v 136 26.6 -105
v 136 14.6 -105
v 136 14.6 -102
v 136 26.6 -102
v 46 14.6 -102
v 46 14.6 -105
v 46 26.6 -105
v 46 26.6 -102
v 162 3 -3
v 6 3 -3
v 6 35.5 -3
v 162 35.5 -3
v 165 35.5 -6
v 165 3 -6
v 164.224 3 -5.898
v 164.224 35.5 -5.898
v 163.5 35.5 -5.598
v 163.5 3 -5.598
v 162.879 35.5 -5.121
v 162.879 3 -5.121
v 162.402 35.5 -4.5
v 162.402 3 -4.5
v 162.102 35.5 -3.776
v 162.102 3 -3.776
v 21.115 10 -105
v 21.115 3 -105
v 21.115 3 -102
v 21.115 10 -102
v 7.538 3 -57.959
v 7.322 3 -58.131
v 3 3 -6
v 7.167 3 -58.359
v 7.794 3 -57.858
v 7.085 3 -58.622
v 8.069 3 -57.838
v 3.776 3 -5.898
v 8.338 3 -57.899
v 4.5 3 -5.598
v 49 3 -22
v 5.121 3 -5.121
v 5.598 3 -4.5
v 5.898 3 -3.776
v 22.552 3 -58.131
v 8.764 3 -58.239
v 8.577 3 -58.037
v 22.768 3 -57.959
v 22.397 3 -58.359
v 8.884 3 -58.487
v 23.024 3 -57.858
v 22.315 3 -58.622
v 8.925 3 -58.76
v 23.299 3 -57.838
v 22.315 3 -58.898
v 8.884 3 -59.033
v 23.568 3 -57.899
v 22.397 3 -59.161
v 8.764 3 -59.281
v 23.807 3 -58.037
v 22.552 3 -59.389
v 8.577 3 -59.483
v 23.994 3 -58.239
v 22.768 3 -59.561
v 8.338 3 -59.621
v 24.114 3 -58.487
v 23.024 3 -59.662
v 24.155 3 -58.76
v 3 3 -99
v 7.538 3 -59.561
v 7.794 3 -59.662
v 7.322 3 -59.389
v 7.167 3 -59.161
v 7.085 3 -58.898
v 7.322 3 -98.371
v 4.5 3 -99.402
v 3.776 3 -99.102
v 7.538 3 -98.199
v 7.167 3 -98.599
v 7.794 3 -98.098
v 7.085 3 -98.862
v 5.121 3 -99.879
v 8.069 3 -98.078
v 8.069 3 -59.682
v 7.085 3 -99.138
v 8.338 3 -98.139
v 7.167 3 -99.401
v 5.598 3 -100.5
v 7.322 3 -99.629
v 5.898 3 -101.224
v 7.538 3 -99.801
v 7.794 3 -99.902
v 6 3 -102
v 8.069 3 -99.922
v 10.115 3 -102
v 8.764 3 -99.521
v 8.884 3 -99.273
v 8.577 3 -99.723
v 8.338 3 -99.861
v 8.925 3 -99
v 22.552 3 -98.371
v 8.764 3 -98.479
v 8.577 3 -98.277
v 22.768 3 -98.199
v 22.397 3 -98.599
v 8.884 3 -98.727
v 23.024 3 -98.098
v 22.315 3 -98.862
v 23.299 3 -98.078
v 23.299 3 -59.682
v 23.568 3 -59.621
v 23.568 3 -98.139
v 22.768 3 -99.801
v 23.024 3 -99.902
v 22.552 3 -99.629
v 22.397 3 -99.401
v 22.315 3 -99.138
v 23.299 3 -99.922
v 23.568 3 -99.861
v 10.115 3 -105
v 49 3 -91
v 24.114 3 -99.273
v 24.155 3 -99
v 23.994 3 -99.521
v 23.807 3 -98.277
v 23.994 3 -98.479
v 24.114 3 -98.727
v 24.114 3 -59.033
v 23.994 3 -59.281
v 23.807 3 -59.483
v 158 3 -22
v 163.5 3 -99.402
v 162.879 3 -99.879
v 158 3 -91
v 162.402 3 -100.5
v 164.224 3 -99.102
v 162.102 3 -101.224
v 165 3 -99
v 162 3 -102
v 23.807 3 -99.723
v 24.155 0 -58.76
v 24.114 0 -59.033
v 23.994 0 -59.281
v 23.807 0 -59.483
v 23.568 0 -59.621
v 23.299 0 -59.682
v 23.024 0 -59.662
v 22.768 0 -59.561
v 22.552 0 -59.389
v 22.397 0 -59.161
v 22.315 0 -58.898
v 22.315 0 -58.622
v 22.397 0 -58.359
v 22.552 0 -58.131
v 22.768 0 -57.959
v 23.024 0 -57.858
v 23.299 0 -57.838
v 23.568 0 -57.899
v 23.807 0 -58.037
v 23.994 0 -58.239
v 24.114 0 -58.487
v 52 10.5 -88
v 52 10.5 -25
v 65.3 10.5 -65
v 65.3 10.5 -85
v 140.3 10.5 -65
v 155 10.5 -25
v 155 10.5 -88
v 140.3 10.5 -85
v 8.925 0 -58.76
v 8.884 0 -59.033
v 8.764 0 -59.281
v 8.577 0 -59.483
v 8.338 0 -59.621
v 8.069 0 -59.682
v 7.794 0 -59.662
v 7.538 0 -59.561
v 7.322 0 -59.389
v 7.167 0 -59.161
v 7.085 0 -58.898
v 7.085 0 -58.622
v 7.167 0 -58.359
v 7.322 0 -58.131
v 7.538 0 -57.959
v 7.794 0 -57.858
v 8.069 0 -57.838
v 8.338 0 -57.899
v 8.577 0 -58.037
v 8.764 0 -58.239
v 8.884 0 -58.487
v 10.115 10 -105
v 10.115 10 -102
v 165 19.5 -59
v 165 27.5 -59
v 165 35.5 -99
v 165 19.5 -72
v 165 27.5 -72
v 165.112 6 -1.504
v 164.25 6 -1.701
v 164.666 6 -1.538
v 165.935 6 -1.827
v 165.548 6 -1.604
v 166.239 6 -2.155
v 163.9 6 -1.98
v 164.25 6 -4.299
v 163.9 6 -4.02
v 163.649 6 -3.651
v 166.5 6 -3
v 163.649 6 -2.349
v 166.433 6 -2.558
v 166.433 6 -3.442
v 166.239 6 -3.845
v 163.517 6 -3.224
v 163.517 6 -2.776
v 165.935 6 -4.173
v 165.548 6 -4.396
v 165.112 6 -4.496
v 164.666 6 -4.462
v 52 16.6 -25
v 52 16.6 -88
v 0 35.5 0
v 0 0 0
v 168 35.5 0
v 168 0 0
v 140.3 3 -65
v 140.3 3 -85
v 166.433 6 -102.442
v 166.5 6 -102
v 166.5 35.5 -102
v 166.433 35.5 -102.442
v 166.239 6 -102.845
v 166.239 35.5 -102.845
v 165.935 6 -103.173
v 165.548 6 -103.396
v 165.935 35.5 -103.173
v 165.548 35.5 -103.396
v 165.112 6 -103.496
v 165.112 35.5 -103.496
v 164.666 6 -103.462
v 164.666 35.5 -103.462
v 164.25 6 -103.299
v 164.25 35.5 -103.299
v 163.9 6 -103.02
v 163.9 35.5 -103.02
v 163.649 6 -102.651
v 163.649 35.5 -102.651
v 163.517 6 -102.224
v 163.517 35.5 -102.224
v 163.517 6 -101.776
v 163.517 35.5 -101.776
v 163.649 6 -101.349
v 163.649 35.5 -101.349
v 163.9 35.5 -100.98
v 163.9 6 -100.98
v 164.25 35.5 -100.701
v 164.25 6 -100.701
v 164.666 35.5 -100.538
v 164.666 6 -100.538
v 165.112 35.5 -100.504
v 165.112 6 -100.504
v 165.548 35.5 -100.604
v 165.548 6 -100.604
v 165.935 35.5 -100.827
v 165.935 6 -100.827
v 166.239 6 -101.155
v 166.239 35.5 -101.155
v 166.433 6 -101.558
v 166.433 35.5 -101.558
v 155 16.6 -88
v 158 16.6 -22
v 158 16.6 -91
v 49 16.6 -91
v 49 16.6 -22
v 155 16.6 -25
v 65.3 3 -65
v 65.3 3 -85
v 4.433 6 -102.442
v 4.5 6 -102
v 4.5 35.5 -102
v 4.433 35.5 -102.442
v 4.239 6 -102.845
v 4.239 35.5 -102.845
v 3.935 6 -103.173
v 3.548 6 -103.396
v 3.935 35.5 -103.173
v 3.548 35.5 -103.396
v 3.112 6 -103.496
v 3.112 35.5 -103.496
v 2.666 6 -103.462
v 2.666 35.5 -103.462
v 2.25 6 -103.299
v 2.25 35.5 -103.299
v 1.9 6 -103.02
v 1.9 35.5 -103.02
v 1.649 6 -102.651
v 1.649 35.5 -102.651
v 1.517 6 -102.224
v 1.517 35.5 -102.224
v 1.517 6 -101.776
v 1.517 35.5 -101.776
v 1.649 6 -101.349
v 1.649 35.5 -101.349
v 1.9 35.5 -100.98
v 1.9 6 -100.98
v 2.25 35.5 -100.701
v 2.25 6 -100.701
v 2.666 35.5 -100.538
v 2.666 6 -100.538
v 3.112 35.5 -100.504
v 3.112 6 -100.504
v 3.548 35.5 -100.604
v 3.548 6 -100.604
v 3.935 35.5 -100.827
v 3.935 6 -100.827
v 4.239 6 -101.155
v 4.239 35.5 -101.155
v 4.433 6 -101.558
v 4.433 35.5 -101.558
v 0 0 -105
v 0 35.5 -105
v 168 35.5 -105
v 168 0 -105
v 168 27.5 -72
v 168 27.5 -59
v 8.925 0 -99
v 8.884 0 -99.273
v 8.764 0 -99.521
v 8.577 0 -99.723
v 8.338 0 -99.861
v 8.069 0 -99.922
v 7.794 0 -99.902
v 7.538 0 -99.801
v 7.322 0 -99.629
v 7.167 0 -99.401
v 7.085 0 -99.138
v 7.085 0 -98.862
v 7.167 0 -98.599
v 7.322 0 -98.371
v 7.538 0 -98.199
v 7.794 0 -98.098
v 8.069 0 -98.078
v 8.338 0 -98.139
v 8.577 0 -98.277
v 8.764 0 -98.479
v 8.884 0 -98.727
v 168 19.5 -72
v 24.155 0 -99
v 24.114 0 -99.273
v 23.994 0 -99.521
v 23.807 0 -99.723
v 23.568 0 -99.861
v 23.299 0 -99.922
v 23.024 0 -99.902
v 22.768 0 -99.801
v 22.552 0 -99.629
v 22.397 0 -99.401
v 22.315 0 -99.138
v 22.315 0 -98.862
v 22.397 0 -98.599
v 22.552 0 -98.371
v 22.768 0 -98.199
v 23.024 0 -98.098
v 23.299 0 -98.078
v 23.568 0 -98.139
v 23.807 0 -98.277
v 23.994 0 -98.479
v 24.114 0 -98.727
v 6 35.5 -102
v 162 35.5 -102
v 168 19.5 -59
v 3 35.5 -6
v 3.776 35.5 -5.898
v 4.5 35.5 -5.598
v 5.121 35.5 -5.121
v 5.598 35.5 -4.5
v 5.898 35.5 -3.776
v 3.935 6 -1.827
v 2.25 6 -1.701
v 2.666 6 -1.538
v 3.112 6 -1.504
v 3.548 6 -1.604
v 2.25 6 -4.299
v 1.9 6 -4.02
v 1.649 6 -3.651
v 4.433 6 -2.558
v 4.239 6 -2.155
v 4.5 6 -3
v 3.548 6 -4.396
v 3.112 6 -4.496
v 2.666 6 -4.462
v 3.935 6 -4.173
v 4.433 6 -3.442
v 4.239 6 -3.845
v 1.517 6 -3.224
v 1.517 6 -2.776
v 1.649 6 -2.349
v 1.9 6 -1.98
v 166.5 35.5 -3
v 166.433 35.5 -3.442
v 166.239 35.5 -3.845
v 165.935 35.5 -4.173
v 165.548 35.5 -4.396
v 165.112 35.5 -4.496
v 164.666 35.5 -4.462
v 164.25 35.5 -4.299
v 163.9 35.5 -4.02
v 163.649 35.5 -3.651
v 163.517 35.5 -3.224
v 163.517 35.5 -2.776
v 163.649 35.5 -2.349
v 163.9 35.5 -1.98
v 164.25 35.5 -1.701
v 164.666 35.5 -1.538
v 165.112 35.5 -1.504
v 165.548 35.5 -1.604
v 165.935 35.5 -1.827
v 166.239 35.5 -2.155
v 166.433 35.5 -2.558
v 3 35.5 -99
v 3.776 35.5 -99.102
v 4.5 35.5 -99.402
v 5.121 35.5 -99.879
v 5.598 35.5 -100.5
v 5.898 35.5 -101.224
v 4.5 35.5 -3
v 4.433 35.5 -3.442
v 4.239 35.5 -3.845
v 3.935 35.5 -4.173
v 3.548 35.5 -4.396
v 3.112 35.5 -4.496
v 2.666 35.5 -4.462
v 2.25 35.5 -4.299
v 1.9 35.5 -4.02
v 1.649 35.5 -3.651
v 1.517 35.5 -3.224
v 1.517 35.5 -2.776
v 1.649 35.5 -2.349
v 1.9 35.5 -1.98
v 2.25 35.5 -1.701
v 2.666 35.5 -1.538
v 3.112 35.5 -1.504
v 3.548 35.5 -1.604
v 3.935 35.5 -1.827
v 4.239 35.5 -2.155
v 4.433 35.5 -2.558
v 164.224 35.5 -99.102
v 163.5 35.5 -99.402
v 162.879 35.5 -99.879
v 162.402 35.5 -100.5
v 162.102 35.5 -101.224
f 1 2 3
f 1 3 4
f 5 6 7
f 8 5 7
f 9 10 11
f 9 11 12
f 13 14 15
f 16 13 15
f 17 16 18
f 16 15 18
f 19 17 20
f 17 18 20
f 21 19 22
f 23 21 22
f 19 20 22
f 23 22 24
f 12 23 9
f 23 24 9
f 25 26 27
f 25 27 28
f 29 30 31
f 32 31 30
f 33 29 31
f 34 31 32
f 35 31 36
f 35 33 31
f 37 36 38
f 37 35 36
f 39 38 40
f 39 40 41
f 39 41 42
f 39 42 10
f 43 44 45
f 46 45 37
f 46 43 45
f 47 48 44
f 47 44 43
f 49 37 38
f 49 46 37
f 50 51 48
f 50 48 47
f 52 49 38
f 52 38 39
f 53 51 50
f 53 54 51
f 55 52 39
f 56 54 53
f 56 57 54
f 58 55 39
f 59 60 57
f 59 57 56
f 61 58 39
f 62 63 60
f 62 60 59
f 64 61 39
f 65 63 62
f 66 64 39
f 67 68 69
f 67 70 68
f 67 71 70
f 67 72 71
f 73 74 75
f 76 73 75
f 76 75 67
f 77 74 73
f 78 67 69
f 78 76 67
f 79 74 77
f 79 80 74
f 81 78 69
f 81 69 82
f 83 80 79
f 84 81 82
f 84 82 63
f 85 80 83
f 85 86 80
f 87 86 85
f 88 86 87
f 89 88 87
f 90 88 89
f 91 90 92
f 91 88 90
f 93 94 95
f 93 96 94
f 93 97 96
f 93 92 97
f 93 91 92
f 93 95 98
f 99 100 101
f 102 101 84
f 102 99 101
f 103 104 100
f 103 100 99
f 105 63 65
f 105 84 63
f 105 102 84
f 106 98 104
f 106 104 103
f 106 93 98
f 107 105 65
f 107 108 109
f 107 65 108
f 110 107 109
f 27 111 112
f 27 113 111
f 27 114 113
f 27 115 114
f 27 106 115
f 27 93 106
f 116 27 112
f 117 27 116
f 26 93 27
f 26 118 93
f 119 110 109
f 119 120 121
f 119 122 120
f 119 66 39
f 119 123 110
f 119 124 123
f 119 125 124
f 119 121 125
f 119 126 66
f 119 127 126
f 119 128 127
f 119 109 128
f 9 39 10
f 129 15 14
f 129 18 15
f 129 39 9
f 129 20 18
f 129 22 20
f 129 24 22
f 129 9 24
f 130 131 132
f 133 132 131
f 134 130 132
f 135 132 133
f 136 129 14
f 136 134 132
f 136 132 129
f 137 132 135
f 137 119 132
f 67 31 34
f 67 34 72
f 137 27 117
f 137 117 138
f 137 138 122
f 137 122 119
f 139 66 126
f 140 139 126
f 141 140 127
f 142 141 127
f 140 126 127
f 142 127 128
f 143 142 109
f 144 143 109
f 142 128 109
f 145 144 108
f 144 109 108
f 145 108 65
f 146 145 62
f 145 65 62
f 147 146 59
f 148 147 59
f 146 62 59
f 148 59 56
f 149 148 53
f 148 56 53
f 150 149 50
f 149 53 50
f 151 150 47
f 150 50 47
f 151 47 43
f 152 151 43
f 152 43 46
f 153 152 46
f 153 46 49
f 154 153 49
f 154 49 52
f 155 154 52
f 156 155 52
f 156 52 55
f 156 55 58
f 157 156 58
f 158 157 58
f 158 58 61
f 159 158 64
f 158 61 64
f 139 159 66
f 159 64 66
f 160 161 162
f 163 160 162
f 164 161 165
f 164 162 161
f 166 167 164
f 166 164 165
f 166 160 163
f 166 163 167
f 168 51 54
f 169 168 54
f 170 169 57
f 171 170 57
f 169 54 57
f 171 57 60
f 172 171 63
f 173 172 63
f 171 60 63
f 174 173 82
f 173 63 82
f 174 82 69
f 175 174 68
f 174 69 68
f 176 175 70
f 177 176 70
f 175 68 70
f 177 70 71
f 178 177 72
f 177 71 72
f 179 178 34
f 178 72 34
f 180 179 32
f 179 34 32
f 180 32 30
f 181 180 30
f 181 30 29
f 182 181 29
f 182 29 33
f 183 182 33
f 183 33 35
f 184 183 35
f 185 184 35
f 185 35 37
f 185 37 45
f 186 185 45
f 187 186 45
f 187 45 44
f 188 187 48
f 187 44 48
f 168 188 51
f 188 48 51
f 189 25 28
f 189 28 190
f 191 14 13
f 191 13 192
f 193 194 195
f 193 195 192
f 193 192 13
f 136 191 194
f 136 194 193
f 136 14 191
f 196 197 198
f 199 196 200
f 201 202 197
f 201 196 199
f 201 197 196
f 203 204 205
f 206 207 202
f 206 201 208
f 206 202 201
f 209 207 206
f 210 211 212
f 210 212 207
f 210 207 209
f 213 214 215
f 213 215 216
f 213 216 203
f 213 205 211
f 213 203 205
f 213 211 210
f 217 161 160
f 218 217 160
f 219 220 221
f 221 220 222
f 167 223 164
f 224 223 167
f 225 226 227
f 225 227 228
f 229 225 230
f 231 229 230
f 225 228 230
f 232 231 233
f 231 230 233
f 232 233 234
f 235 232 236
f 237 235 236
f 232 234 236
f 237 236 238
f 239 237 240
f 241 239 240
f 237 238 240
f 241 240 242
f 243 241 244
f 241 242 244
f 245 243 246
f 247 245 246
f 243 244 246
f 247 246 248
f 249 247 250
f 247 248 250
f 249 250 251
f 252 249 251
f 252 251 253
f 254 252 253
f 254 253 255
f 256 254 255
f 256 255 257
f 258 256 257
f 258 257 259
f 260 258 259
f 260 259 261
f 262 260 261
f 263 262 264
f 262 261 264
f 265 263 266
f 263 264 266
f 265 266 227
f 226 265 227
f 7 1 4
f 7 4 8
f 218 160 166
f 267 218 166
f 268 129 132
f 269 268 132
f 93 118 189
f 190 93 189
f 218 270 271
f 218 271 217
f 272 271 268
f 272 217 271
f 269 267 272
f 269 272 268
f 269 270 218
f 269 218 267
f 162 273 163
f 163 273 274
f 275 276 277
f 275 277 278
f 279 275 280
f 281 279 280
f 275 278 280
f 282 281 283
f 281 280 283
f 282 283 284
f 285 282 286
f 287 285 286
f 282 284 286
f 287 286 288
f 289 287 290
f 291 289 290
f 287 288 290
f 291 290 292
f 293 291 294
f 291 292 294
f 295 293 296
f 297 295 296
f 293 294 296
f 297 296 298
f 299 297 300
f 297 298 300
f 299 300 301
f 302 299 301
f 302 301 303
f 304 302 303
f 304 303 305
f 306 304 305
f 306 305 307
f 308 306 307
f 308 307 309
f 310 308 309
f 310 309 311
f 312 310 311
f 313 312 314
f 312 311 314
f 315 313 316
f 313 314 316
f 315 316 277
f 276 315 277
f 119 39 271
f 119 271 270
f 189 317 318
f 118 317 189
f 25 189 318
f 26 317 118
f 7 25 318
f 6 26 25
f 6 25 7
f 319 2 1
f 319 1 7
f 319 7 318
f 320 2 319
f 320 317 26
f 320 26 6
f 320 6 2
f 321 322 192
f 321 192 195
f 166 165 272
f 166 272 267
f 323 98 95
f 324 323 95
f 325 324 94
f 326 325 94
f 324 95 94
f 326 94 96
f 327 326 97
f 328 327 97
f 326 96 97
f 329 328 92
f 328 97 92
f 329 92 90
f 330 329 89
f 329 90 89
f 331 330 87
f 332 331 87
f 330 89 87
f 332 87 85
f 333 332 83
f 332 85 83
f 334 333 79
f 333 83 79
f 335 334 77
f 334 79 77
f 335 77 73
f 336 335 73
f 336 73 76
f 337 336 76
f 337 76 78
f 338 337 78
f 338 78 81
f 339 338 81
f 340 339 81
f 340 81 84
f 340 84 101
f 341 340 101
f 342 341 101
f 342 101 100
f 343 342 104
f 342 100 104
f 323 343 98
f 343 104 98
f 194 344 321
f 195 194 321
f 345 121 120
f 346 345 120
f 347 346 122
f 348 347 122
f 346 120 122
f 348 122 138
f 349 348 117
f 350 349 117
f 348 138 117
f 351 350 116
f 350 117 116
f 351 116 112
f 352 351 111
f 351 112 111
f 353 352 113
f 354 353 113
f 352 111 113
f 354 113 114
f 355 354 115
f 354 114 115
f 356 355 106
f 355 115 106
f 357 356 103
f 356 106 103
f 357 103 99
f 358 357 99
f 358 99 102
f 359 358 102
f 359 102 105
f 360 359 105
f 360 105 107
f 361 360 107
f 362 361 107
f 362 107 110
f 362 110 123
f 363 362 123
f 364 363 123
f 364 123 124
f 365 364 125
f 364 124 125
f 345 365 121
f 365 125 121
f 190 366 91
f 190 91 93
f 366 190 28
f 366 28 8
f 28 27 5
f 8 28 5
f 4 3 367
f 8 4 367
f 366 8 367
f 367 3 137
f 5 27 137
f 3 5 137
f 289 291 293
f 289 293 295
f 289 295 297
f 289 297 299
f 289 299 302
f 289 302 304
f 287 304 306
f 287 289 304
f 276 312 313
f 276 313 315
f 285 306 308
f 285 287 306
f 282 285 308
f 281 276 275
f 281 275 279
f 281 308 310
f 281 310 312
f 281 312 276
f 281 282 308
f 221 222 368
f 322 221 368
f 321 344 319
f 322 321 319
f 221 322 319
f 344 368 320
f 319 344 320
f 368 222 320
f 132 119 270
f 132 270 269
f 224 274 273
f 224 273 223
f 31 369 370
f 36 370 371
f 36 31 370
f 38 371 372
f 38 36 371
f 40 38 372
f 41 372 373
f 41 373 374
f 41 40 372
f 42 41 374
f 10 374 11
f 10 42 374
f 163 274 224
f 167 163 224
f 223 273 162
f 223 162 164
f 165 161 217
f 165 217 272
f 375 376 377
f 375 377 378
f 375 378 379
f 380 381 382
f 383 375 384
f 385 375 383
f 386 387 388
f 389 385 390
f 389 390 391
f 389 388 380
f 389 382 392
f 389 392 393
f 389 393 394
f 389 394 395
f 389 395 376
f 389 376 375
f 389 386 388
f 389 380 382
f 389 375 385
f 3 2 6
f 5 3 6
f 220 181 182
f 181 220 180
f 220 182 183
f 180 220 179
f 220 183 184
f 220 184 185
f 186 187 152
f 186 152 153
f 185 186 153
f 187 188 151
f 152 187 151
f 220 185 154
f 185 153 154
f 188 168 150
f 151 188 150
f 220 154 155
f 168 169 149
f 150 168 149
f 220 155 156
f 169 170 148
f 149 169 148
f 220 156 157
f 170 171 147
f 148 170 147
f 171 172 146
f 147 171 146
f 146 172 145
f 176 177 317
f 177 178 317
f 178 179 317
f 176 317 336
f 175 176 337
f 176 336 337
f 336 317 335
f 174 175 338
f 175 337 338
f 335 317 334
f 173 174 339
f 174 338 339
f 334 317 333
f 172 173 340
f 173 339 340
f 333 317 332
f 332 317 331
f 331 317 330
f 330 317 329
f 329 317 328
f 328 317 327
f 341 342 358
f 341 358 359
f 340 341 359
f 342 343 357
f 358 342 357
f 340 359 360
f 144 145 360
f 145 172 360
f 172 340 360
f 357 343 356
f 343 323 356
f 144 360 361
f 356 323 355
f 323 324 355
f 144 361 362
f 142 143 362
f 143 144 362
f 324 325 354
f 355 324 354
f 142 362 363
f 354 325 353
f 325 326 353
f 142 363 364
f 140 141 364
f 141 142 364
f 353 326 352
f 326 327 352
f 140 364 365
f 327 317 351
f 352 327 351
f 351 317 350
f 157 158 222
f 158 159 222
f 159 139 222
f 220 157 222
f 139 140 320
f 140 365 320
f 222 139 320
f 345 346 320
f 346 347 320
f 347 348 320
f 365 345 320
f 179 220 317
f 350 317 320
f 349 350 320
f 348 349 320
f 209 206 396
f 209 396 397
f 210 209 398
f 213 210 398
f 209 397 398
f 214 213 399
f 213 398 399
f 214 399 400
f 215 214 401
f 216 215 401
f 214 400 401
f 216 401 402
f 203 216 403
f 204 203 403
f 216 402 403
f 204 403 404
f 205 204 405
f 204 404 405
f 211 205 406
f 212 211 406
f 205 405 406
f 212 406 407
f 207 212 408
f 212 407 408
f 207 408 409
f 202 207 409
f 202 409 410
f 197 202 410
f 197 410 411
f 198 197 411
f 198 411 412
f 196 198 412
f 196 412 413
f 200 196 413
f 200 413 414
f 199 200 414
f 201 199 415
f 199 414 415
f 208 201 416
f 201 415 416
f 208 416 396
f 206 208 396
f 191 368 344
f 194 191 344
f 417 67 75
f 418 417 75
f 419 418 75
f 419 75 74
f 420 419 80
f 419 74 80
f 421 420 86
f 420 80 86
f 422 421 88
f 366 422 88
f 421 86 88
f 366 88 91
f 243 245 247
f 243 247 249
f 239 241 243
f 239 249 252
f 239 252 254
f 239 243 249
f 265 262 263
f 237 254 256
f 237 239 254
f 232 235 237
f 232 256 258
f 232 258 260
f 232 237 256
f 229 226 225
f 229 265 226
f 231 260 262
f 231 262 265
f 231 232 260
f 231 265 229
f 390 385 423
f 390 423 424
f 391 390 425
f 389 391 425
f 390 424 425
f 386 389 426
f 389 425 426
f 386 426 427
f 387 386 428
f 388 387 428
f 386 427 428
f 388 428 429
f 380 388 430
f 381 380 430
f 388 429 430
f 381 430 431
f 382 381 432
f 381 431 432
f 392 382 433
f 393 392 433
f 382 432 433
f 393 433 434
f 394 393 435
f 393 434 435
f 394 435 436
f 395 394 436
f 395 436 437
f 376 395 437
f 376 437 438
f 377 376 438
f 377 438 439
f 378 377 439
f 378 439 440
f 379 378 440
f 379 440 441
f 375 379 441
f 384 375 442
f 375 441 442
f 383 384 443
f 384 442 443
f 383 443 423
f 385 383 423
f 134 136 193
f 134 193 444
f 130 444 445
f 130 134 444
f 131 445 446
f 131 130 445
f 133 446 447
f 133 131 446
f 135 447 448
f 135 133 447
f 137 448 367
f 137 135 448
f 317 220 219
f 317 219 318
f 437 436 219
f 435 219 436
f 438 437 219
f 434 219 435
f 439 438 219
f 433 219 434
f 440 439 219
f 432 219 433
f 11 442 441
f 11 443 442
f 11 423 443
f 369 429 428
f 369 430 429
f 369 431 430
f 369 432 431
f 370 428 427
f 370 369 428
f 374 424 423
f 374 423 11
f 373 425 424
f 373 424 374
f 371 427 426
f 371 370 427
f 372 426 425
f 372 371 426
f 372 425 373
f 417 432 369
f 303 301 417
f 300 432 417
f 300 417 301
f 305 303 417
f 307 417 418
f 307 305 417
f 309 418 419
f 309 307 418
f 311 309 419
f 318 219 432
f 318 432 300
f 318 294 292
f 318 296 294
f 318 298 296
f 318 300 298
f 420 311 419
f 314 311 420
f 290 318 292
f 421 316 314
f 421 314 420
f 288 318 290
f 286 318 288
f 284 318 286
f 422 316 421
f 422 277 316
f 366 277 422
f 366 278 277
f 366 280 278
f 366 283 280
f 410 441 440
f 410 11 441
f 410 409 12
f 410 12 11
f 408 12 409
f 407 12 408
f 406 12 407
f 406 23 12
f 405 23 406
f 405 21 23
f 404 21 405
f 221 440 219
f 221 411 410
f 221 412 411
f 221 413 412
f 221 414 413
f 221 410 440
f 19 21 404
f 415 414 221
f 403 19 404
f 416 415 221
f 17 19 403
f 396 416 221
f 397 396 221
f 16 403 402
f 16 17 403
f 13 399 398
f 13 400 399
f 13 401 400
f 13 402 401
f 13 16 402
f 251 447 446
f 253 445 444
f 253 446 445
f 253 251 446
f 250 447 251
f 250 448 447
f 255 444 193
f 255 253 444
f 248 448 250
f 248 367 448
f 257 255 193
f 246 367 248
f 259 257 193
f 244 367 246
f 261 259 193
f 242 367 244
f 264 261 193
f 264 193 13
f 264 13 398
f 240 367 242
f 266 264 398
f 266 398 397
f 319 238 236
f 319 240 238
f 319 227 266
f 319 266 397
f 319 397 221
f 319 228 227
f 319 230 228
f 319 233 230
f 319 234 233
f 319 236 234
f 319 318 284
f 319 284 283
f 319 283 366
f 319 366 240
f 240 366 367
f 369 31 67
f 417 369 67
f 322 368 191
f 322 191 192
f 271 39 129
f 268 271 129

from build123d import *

# Parameters (mm, degrees)
SKETCH1_W           = 168
SKETCH1_H           = 105
BOSS_EXTRUDE1_DEPTH = 35.5
SHELL3_T            = -3
SKETCH3_R           = 0.925
CUT_EXTRUDE2_DEPTH  = 3
SKETCH7_W           = 109
SKETCH7_H           = 69
SKETCH7_W_2         = 103
SKETCH7_H_2         = 63
BOSS_EXTRUDE3_DEPTH = 13.6
SKETCH8_W           = 103
SKETCH8_H           = 63
SKETCH8_W_2         = 75
SKETCH8_H_2         = 20
BOSS_EXTRUDE4_DEPTH = 7.5
SKETCH2_W           = 11
SKETCH2_H           = 7
SKETCH2_W_2         = 90
SKETCH2_H_2         = 12
CUT_EXTRUDE1_DEPTH  = 3
BOSS_EXTRUDE2_DEPTH = 32.5
SKETCH5_R           = 1.5
CUT_EXTRUDE3_DEPTH  = 29.5
SKETCH13_W          = 13
SKETCH13_H          = 8
CUT_EXTRUDE8_DEPTH  = 3


with BuildPart() as part:
    # Sketch1 → Boss-Extrude1 (new body)
    with BuildSketch(Plane(origin=(0, 0, 0), x_dir=(1, 0, 0), z_dir=(0, 1, 0))):
        with Locations((84, 52.5)):
            Rectangle(SKETCH1_W, SKETCH1_H)
    extrude(amount=BOSS_EXTRUDE1_DEPTH)

    # Shell3
    shell3_openings = [part.faces().sort_by_distance(p)[0] for p in [
        (84, 35.5, -52.5),
    ]]
    offset(amount=SHELL3_T, openings=shell3_openings, kind=Kind.INTERSECTION)

    # Sketch3 → Cut-Extrude2 (cut)
    with BuildSketch(Plane(origin=(0, 3, 0), x_dir=(1, 0, 0), z_dir=(0, 1, 0))):
        with Locations((8, 99)):
            Circle(SKETCH3_R)
        with Locations((23.23, 99)):
            Circle(SKETCH3_R)
        with Locations((23.23, 58.76)):
            Circle(SKETCH3_R)
        with Locations((8, 58.76)):
            Circle(SKETCH3_R)
    extrude(amount=-CUT_EXTRUDE2_DEPTH, mode=Mode.SUBTRACT)

    # Sketch7 → Boss-Extrude3 (add)
    with BuildSketch(Plane(origin=(0, 3, 0), x_dir=(1, 0, 0), z_dir=(0, 1, 0))):
        with Locations((103.5, 56.5)):
            Rectangle(SKETCH7_W, SKETCH7_H)
        with Locations((103.5, 56.5)):
            Rectangle(SKETCH7_W_2, SKETCH7_H_2, mode=Mode.SUBTRACT)
    extrude(amount=BOSS_EXTRUDE3_DEPTH)

    # Sketch8 → Boss-Extrude4 (add)
    with BuildSketch(Plane(origin=(0, 3, 0), x_dir=(1, 0, 0), z_dir=(0, 1, 0))):
        with Locations((103.5, 56.5)):
            Rectangle(SKETCH8_W, SKETCH8_H)
        with Locations((102.8, 75)):
            Rectangle(SKETCH8_W_2, SKETCH8_H_2, mode=Mode.SUBTRACT)
    extrude(amount=BOSS_EXTRUDE4_DEPTH)

    # Sketch2 → Cut-Extrude1 (cut)
    with BuildSketch(Plane(origin=(0, 0, -105), x_dir=(-1, 0, 0), z_dir=(0, 0, -1))):
        with Locations((-15.615, 6.5)):
            Rectangle(SKETCH2_W, SKETCH2_H)
        with Locations((-91, 20.6)):
            Rectangle(SKETCH2_W_2, SKETCH2_H_2)
    extrude(amount=-CUT_EXTRUDE1_DEPTH, mode=Mode.SUBTRACT)

    # Sketch4 → Boss-Extrude2 (add)
    with BuildSketch(Plane(origin=(0, 3, 0), x_dir=(1, 0, 0), z_dir=(0, 1, 0))):
        with BuildLine():
            Line((6, 102), (3, 102))
            Line((3, 102), (3, 99))
            ThreePointArc((3, 99), (5.121320344, 99.878679656), (6, 102))
        make_face()
        with BuildLine():
            Line((162, 102), (165, 102))
            Line((165, 102), (165, 99))
            ThreePointArc((165, 99), (162.878679656, 99.878679656), (162, 102))
        make_face()
        with BuildLine():
            Line((165, 3), (165, 6))
            ThreePointArc((165, 6), (162.878679656, 5.121320344), (162, 3))
            Line((162, 3), (165, 3))
        make_face()
        with BuildLine():
            Line((6, 3), (3, 3))
            Line((3, 3), (3, 6))
            ThreePointArc((3, 6), (5.121320344, 5.121320344), (6, 3))
        make_face()
    extrude(amount=BOSS_EXTRUDE2_DEPTH)

    # Sketch5 → Cut-Extrude3 (cut)
    with BuildSketch(Plane(origin=(0, 35.5, 0), x_dir=(1, 0, 0), z_dir=(0, 1, 0))):
        with Locations((3, 102)):
            Circle(SKETCH5_R)
        with Locations((165, 102)):
            Circle(SKETCH5_R)
        with Locations((3, 3)):
            Circle(SKETCH5_R)
        with Locations((165, 3)):
            Circle(SKETCH5_R)
    extrude(amount=-CUT_EXTRUDE3_DEPTH, mode=Mode.SUBTRACT)

    # Sketch13 → Cut-Extrude8 (cut)
    with BuildSketch(Plane(origin=(168, 0, 0), x_dir=(0, 0, -1), z_dir=(1, 0, 0))):
        with Locations((65.5, 23.5)):
            Rectangle(SKETCH13_W, SKETCH13_H)
    extrude(amount=-CUT_EXTRUDE8_DEPTH, mode=Mode.SUBTRACT)


solid = part.part
